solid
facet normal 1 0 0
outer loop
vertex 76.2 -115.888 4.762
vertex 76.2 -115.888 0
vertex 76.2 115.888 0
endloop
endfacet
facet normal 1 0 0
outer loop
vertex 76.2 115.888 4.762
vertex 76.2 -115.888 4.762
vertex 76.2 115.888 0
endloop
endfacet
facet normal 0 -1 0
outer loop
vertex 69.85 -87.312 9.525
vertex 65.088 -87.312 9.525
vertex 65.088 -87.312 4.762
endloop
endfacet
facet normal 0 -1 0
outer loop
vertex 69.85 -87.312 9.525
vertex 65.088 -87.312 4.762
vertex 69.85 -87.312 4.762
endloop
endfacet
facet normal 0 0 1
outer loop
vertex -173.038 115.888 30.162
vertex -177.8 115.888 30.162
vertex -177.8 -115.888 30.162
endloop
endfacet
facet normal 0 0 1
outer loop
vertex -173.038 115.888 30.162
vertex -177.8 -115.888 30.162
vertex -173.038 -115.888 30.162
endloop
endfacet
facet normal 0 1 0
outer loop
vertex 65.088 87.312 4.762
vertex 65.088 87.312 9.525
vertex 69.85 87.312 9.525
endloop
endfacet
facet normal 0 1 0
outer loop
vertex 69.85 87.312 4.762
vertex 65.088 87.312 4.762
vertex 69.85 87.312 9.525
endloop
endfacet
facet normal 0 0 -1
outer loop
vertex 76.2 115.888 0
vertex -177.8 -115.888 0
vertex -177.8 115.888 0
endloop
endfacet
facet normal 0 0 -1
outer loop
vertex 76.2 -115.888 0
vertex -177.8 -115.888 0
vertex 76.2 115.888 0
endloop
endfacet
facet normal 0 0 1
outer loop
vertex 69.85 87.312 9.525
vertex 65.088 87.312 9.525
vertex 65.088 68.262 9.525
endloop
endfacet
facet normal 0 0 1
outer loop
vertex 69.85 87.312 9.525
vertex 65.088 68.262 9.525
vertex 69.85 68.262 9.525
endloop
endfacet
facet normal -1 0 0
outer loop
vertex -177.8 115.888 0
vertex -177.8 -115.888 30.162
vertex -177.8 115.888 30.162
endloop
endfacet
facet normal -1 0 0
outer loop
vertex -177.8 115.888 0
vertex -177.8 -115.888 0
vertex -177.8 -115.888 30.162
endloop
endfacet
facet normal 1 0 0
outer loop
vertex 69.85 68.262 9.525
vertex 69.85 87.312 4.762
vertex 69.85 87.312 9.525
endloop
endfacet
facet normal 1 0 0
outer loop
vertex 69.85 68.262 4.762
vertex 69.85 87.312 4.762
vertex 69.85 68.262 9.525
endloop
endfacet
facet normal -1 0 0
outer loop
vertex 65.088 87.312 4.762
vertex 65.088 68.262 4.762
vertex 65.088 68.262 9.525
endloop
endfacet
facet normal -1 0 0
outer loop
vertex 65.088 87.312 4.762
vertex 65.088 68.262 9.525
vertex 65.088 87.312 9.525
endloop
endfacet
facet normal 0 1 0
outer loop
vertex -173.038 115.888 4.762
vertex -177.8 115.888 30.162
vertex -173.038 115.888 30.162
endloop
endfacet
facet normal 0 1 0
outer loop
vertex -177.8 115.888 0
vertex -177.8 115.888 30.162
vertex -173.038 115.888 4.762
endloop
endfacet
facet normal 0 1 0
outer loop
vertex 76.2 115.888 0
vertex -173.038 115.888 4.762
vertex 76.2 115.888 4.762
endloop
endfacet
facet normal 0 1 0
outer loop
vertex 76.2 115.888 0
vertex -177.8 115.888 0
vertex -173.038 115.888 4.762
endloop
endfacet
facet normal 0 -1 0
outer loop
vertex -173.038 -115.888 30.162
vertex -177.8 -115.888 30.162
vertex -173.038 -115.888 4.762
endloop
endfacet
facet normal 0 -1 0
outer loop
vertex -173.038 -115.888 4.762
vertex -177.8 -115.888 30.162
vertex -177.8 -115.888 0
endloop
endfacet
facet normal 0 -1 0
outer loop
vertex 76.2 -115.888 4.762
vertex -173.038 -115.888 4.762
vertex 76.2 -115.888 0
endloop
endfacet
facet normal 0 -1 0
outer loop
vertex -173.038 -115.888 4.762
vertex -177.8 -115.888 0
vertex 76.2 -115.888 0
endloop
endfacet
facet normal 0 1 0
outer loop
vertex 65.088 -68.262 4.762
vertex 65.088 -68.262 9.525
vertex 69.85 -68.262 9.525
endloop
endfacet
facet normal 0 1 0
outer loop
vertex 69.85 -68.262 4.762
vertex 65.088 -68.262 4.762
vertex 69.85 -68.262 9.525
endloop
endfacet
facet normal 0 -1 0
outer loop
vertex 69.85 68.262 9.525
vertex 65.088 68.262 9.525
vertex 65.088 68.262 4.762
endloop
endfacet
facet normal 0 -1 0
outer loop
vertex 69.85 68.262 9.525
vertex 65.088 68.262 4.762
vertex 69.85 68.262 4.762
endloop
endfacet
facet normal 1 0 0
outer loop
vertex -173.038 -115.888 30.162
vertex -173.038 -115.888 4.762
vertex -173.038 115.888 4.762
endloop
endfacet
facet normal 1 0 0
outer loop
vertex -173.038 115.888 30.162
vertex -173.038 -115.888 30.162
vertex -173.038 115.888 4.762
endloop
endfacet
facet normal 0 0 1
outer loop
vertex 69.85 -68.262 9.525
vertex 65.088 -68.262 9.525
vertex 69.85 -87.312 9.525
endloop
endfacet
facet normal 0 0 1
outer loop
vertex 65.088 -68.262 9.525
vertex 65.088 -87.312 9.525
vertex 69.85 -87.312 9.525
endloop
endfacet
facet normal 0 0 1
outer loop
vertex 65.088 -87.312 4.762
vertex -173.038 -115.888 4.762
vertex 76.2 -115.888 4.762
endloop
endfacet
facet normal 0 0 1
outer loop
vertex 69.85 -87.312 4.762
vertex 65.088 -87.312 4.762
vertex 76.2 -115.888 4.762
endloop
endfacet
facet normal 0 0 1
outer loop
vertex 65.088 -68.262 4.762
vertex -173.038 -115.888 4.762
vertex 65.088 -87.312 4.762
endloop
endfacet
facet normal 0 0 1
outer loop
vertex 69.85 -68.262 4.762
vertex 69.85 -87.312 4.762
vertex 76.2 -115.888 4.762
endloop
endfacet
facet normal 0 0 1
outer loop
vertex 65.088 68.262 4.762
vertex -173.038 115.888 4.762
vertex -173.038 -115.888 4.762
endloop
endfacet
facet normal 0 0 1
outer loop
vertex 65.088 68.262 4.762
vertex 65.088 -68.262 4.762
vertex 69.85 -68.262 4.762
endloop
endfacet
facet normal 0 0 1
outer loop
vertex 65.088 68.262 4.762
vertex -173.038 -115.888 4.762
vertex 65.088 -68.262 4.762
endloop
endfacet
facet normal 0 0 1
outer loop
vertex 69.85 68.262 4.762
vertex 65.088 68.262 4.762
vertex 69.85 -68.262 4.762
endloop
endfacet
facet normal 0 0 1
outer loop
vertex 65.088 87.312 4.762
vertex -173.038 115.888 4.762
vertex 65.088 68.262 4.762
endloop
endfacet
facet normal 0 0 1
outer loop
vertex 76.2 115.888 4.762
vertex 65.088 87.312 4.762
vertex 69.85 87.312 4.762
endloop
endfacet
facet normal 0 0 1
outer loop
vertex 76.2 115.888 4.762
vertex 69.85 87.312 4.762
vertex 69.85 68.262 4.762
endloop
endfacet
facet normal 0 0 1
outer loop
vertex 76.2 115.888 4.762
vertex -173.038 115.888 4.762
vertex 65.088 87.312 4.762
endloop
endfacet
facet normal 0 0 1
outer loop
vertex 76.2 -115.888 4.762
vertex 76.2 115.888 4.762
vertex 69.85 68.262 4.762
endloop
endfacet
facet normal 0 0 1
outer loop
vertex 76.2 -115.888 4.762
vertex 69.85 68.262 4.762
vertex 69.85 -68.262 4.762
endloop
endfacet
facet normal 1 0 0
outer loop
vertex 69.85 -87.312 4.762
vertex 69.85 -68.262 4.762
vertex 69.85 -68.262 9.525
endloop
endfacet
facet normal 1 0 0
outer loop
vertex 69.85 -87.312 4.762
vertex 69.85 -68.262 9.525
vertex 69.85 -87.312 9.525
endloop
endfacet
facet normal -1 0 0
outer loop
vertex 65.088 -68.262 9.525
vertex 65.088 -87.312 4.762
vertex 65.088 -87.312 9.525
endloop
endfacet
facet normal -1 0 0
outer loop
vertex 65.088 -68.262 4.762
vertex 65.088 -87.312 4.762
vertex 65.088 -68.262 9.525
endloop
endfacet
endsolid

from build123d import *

# Parameters (mm, degrees)
F0_W     = 152.4
F0_H     = 231.775
F0_W_2   = 25.4
F0_W_3   = 76.2
F1_DEPTH = 4.7625
F2_W     = 4.7625
F2_H     = 231.775
F3_DEPTH = 25.4
F4_W     = 4.7625
F4_H     = 9.525
F5_DEPTH = 9.525


with BuildPart() as f1:
    # F0 (on Top) → F1 (new body)
    with BuildSketch(Plane.XY):
        Rectangle(F0_W, F0_H)
        with Locations((-88.9, 0)):
            Rectangle(F0_W_2, F0_H)
        with Locations((-139.7, 0)):
            Rectangle(F0_W_3, F0_H)
    extrude(amount=F1_DEPTH)

    # F2 (on face) → F3 (join)
    with BuildSketch(Plane.XY.offset(4.7625)):
        with Locations((-175.41875, 0)):
            Rectangle(F2_W, F2_H)
    extrude(amount=F3_DEPTH)

    # F4 (on face) → F5 (join)
    with BuildSketch(Plane(origin=(0, 0, 0), x_dir=(1, 0, 0), z_dir=(0, 0, -1))):
        with Locations((67.46875, 73.025)):
            Rectangle(F4_W, F4_H)
        with Locations((67.46875, -73.025)):
            Rectangle(F4_W, F4_H)
        with Locations((67.46875, 82.55)):
            Rectangle(F4_W, F4_H)
        with Locations((67.46875, -82.55)):
            Rectangle(F4_W, F4_H)
    extrude(amount=-F5_DEPTH)


solid = f1.part
